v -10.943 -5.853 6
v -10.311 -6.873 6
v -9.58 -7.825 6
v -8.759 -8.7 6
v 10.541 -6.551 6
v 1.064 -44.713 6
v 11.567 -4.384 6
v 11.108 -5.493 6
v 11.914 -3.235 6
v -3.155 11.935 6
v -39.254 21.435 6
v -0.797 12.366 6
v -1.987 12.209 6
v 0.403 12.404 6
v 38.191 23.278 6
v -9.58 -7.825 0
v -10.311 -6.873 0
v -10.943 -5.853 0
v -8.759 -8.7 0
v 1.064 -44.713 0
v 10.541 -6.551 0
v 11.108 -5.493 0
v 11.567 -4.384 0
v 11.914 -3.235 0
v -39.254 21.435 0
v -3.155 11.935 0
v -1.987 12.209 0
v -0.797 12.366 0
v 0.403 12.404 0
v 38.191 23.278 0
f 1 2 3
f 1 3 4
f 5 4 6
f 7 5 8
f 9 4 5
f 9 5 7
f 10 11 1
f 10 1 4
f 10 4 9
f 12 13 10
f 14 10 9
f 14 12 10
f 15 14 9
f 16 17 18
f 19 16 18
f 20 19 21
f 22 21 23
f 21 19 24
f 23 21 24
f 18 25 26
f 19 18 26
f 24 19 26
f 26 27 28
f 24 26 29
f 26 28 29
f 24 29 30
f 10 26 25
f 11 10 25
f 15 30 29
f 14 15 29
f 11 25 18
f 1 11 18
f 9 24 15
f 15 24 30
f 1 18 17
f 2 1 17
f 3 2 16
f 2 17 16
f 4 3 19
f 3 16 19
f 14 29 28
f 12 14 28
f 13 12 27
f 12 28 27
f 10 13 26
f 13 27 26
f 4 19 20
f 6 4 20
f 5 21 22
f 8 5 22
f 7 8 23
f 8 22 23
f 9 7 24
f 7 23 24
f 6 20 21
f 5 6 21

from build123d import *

# Parameters (mm, degrees)
F1_DEPTH = 6


with BuildPart() as f1:
    # F0 (on Top) → F1 (new body)
    with BuildSketch(Plane.XY):
        with BuildLine():
            ThreePointArc((0.4028900985, 12.4038021196), (2.5709266159, 12.1679521994), (4.6613367434, 11.5465078941))
            Line((4.6613367434, 11.5465078941), (27.7654736656, 20.0070271084))
            Line((27.7654736656, 20.0070271084), (18.6411851954, 12.0324539382))
            Line((18.6411851954, 12.0324539382), (29.9736770552, 16.1823066442))
            Line((29.9736770552, 16.1823066442), (12.269739771, 0.709172083))
            ThreePointArc((12.269739771, 0.709172083), (12.2734322165, 0.5725746976), (12.2755807666, 0.4359443072))
            ThreePointArc((12.2755807666, 0.4359443072), (12.2760408839, 0.3750438497), (12.2761942576, 0.3141418472))
            ThreePointArc((12.2761942576, 0.3141418472), (12.2744790315, 0.1104832554), (12.2693338398, -0.0931175575))
            ThreePointArc((12.2693338398, -0.0931175575), (12.2708871547, -0.2050074672), (12.2714049411, -0.3169069604))
            ThreePointArc((12.2714049411, -0.3169069604), (12.1817268997, -1.786827199), (11.9140229769, -3.2349439997))
            Line((11.9140229769, -3.2349439997), (38.1905606473, 23.2777061292))
            Line((38.1905606473, 23.2777061292), (0.4028900985, 12.4038021196))
        make_face()
        with BuildLine():
            Line((27.7654736656, 20.0070271084), (4.6613367434, 11.5465078941))
            ThreePointArc((4.6613367434, 11.5465078941), (10.0808508039, 7.2618778264), (12.269739771, 0.709172083))
            Line((12.269739771, 0.709172083), (29.9736770552, 16.1823066442))
            Line((29.9736770552, 16.1823066442), (18.6411851954, 12.0324539382))
            Line((18.6411851954, 12.0324539382), (27.7654736656, 20.0070271084))
        make_face()
        with BuildLine():
            Line((3.4438568973, -34.0491190968), (7.6689007896, -9.8100899824))
            ThreePointArc((7.6689007896, -9.8100899824), (1.2485452749, -12.3612118011), (-5.520708846, -10.980492381))
            Line((-5.520708846, -10.980492381), (-0.9725498819, -34.0491190968))
            Line((-0.9725498819, -34.0491190968), (1.0998181826, -22.159966905))
            Line((1.0998181826, -22.159966905), (3.4438568973, -34.0491190968))
        make_face()
        with BuildLine():
            ThreePointArc((-12.3302375329, -1.7364179117), (-11.3293960788, 5.0993339748), (-6.749030925, 10.271320298))
            Line((-6.749030925, 10.271320298), (-29.0011271733, 17.8668124526))
            Line((-29.0011271733, 17.8668124526), (-19.7410033781, 10.1275129668))
            Line((-19.7410033781, 10.1275129668), (-31.2093305629, 14.0420919883))
            Line((-31.2093305629, 14.0420919883), (-12.3302375329, -1.7364179117))
        make_face()
        with BuildLine():
            ThreePointArc((10.6356638011, 0.0027651132), (9.2601354167, 5.3290721002), (5.4775645066, 9.3232906427))
            ThreePointArc((5.4775645066, 9.3232906427), (4.2590097093, 9.8987590223), (2.9792313185, 10.3209046376))
            ThreePointArc((2.9792313185, 10.3209046376), (2.4541666957, 10.4453946208), (1.9236286682, 10.5439847593))
            ThreePointArc((1.9236286682, 10.5439847593), (-6.8022401005, 8.1831805041), (-10.8129887968, 0.0820646923))
            ThreePointArc((-10.8129887968, 0.0820646923), (-10.702081647, -1.260968817), (-10.4277813138, -2.5803621359))
            ThreePointArc((-10.4277813138, -2.5803621359), (-10.2730604705, -3.0973265194), (-10.0931729928, -3.6060810855))
            ThreePointArc((-10.0931729928, -3.6060810855), (-3.68572215, -9.9825029817), (5.3354242901, -9.405355335))
            ThreePointArc((5.3354242901, -9.405355335), (6.4430719465, -8.6377900971), (7.4485499862, -7.7405422847))
            ThreePointArc((7.4485499862, -7.7405422847), (7.8188937649, -7.3480679932), (8.1695443246, -6.9379036738))
            ThreePointArc((8.1695443246, -6.9379036738), (10.0008142042, -3.6801219501), (10.6356638011, 0.0027651132))
        make_face()
        with BuildLine():
            ThreePointArc((-6.5153292279, 10.4129926365), (-6.2860944668, 10.5450765934), (-6.0540247496, 10.6721135715))
            ThreePointArc((-6.0540247496, 10.6721135715), (-4.6462138612, 11.3988678062), (-3.1554678048, 11.9353185591))
            Line((-3.1554678048, 11.9353185591), (-39.2543651733, 21.4351426407))
            Line((-39.2543651733, 21.4351426407), (-10.9434527883, -5.8529879996))
            ThreePointArc((-10.9434527883, -5.8529879996), (-11.8232190246, -3.8574883391), (-12.3302375329, -1.7364179117))
            Line((-12.3302375329, -1.7364179117), (-31.2093305629, 14.0420919883))
            Line((-31.2093305629, 14.0420919883), (-19.7410033781, 10.1275129668))
            Line((-19.7410033781, 10.1275129668), (-29.0011271733, 17.8668124526))
            Line((-29.0011271733, 17.8668124526), (-6.749030925, 10.271320298))
            ThreePointArc((-6.749030925, 10.271320298), (-6.6325803419, 10.3428167423), (-6.5153292279, 10.4129926365))
        make_face()
        with BuildLine():
            ThreePointArc((-8.8525103113, -8.3558995928), (-9.5275626565, -7.5262882248), (-10.1266632902, -6.6402695335))
            Line((-10.1266632902, -6.6402695335), (-10.9434527883, -5.8529879996))
            ThreePointArc((-10.9434527883, -5.8529879996), (-9.9572381658, -7.3581984231), (-8.758555172, -8.7003745594))
            Line((-8.758555172, -8.7003745594), (-8.8525103113, -8.3558995928))
        make_face()
        with BuildLine():
            ThreePointArc((10.5405626898, -6.55081412), (9.2522924087, -8.3104638603), (7.6689007896, -9.8100899824))
            Line((7.6689007896, -9.8100899824), (3.4438568973, -34.0491190968))
            Line((3.4438568973, -34.0491190968), (1.0998181826, -22.159966905))
            Line((1.0998181826, -22.159966905), (-0.9725498819, -34.0491190968))
            Line((-0.9725498819, -34.0491190968), (-5.520708846, -10.980492381))
            ThreePointArc((-5.520708846, -10.980492381), (-5.6408518746, -10.9153914399), (-5.7602515386, -10.8489369436))
            ThreePointArc((-5.7602515386, -10.8489369436), (-5.9892569814, -10.7164557955), (-6.2153090902, -10.5789960141))
            ThreePointArc((-6.2153090902, -10.5789960141), (-7.5486021639, -9.7231731384), (-8.758555172, -8.7003745594))
            Line((-8.758555172, -8.7003745594), (1.063804526, -44.7128487699))
            Line((1.063804526, -44.7128487699), (10.5405626898, -6.55081412))
        make_face()
        with BuildLine():
            Line((-9.7600062572, -5.0286772803), (-10.1642111321, -3.546709802))
            Line((-10.1642111321, -3.546709802), (-10.3919691545, -3.3563573203))
            ThreePointArc((-10.3919691545, -3.3563573203), (-10.1100176265, -4.2053770686), (-9.7600062572, -5.0286772803))
        make_face()
        with BuildLine():
            ThreePointArc((-11.7489151685, 2.2634127141), (-10.0376335343, 6.7727992383), (-6.699900485, 10.2545501984))
            Line((-6.699900485, 10.2545501984), (-6.749030925, 10.271320298))
            ThreePointArc((-6.749030925, 10.271320298), (-11.3293960788, 5.0993339748), (-12.3302375329, -1.7364179117))
            Line((-12.3302375329, -1.7364179117), (-11.7626156156, -2.2108171864))
            ThreePointArc((-11.7626156156, -2.2108171864), (-11.8887787297, -1.0636337019), (-11.9049976409, 0.0903524443))
            ThreePointArc((-11.9049976409, 0.0903524443), (-11.8759986025, 1.1804050896), (-11.7489151685, 2.2634127141))
        make_face()
        with BuildLine():
            Line((5.0125747281, -10.1984064277), (6.5174877996, -8.6799706946))
            ThreePointArc((6.5174877996, -8.6799706946), (5.9378995495, -9.0613109824), (5.3354242901, -9.405355335))
            ThreePointArc((5.3354242901, -9.405355335), (-0.132259044, -10.9947864413), (-5.6621272644, -9.6374324899))
            ThreePointArc((-5.6621272644, -9.6374324899), (-0.3974988939, -11.3017490918), (5.0125747281, -10.1984064277))
        make_face()
        with BuildLine():
            ThreePointArc((-5.6621272644, -9.6374324899), (-0.132259044, -10.9947864413), (5.3354242901, -9.405355335))
            ThreePointArc((5.3354242901, -9.405355335), (-3.68572215, -9.9825029817), (-10.0931729928, -3.6060810855))
            Line((-10.0931729928, -3.6060810855), (-10.1642111321, -3.546709802))
            Line((-10.1642111321, -3.546709802), (-9.7600062572, -5.0286772803))
            ThreePointArc((-9.7600062572, -5.0286772803), (-8.0406593478, -7.6261124412), (-5.6621272644, -9.6374324899))
        make_face()
        with BuildLine():
            ThreePointArc((6.3257916804, 9.4402202667), (9.8941847419, 5.4835945189), (11.1845627577, 0.3141418472))
            ThreePointArc((11.1845627577, 0.3141418472), (11.1827531684, 0.1146231984), (11.1773249957, -0.0848298055))
            ThreePointArc((11.1773249957, -0.0848298055), (11.1791613128, -0.2008619253), (11.1797734412, -0.3169069604))
            ThreePointArc((11.1797734412, -0.3169069604), (10.9074871997, -2.7492222186), (10.1041084384, -5.0611218442))
            Line((10.1041084384, -5.0611218442), (10.9828153628, -4.1745191439))
            ThreePointArc((10.9828153628, -4.1745191439), (11.5397204119, -2.1187882177), (11.727295301, 0.0027651132))
            ThreePointArc((11.727295301, 0.0027651132), (11.726746492, 0.1179679372), (11.7251001149, 0.2331603037))
            ThreePointArc((11.7251001149, 0.2331603037), (10.5973308535, 5.1066271569), (7.5935382455, 9.1065987374))
            Line((7.5935382455, 9.1065987374), (6.3257916804, 9.4402202667))
        make_face()
        with BuildLine():
            ThreePointArc((5.8742513084, -10.3552066112), (4.9976095842, -10.7782939798), (4.0897767259, -11.1294963939))
            Line((4.0897767259, -11.1294963939), (3.9142846746, -11.3065653599))
            ThreePointArc((3.9142846746, -11.3065653599), (4.9157385069, -10.8751190299), (5.8742513084, -10.3552066112))
        make_face()
        with BuildLine():
            ThreePointArc((11.6626764745, -3.4885490204), (11.2817381271, -4.4879671843), (10.8139737491, -5.4498128981))
            Line((10.8139737491, -5.4498128981), (10.5405626898, -6.55081412))
            ThreePointArc((10.5405626898, -6.55081412), (11.3510058434, -4.9441219916), (11.9140229769, -3.2349439997))
            Line((11.9140229769, -3.2349439997), (11.6626764745, -3.4885490204))
        make_face()
        with BuildLine():
            Line((7.6689007896, -9.8100899824), (7.7959316544, -9.0813153449))
            ThreePointArc((7.7959316544, -9.0813153449), (6.865523171, -9.764167549), (5.8742513084, -10.3552066112))
            ThreePointArc((5.8742513084, -10.3552066112), (4.9157385069, -10.8751190299), (3.9142846746, -11.3065653599))
            ThreePointArc((3.9142846746, -11.3065653599), (-0.8465994279, -12.0792452537), (-5.5307507336, -10.929559122))
            Line((-5.5307507336, -10.929559122), (-5.520708846, -10.980492381))
            ThreePointArc((-5.520708846, -10.980492381), (1.2485452749, -12.3612118011), (7.6689007896, -9.8100899824))
        make_face()
        with BuildLine():
            Line((-5.5307507336, -10.929559122), (-5.6606273112, -10.2708147133))
            ThreePointArc((-5.6606273112, -10.2708147133), (-7.5163167375, -9.0080900384), (-9.1066473086, -7.4241375373))
            Line((-9.1066473086, -7.4241375373), (-9.0329015858, -7.6945171633))
            Line((-9.0329015858, -7.6945171633), (-5.8270392256, -10.7845620799))
            ThreePointArc((-5.8270392256, -10.7845620799), (-5.6793894507, -10.8580710084), (-5.5307507336, -10.929559122))
        make_face()
        with BuildLine():
            Line((-10.7758190254, -1.304324656), (-11.3383664085, 0.758186161))
            ThreePointArc((-11.3383664085, 0.758186161), (-11.3123004869, -1.0659153578), (-10.9851179751, -2.8606235198))
            Line((-10.9851179751, -2.8606235198), (-10.3919691545, -3.3563573203))
            ThreePointArc((-10.3919691545, -3.3563573203), (-10.6326845696, -2.3394676554), (-10.7758190254, -1.304324656))
        make_face()
        with BuildLine():
            ThreePointArc((-5.5151977313, 9.7222622954), (-3.1835062565, 10.7858232363), (-0.6689941305, 11.2809755123))
            Line((-0.6689941305, 11.2809755123), (-1.8761680541, 11.5986566812))
            ThreePointArc((-1.8761680541, 11.5986566812), (-4.0430764441, 11.0133662568), (-6.0644728036, 10.0376544095))
            ThreePointArc((-6.0644728036, 10.0376544095), (-9.7211342723, 6.6242441529), (-11.6833149714, 2.0228976565))
            Line((-11.6833149714, 2.0228976565), (-11.3383664085, 0.758186161))
            ThreePointArc((-11.3383664085, 0.758186161), (-9.5888523737, 5.995118686), (-5.5151977313, 9.7222622954))
        make_face()
        with BuildLine():
            Line((7.8293850735, -8.8893934571), (7.9699316263, -8.0830794701))
            ThreePointArc((7.9699316263, -8.0830794701), (6.5792600216, -9.263781918), (5.0125747281, -10.1984064277))
            Line((5.0125747281, -10.1984064277), (4.0897767259, -11.1294963939))
            ThreePointArc((4.0897767259, -11.1294963939), (4.9976095842, -10.7782939798), (5.8742513084, -10.3552066112))
            ThreePointArc((5.8742513084, -10.3552066112), (6.8889414208, -9.6718158131), (7.8293850735, -8.8893934571))
        make_face()
        with BuildLine():
            ThreePointArc((-1.8761680541, 11.5986566812), (0.9760018676, 11.7484804193), (3.7837480213, 11.2251430982))
            Line((3.7837480213, 11.2251430982), (3.9666839612, 11.2921325313))
            ThreePointArc((3.9666839612, 11.2921325313), (1.6790161925, 11.9204940635), (-0.6873104589, 12.0900824316))
            Line((-0.6873104589, 12.0900824316), (-2.1471965404, 11.6699808248))
            Line((-2.1471965404, 11.6699808248), (-1.8761680541, 11.5986566812))
        make_face()
        with BuildLine():
            ThreePointArc((-10.8129887968, 0.0820646923), (-9.4556348454, 5.6119329127), (-5.5151977313, 9.7222622954))
            ThreePointArc((-5.5151977313, 9.7222622954), (-9.5888523737, 5.995118686), (-11.3383664085, 0.758186161))
            Line((-11.3383664085, 0.758186161), (-10.7758190254, -1.304324656))
            ThreePointArc((-10.7758190254, -1.304324656), (-10.8162752771, -0.6117163638), (-10.8129887968, 0.0820646923))
        make_face()
        with BuildLine():
            Line((10.9828153628, -4.1745191439), (10.1041084384, -5.0611218442))
            ThreePointArc((10.1041084384, -5.0611218442), (9.1649765079, -6.6624664984), (7.9699316263, -8.0830794701))
            Line((7.9699316263, -8.0830794701), (7.8293850735, -8.8893934571))
            ThreePointArc((7.8293850735, -8.8893934571), (9.6864815652, -6.7194826211), (10.9828153628, -4.1745191439))
        make_face()
        with BuildLine():
            ThreePointArc((-9.1066473086, -7.4241375373), (-10.6624834328, -5.0289977982), (-11.6131330948, -2.3357496411))
            Line((-11.6131330948, -2.3357496411), (-11.7626156156, -2.2108171864))
            ThreePointArc((-11.7626156156, -2.2108171864), (-11.1629587809, -4.5061763557), (-10.1266632902, -6.6402695335))
            Line((-10.1266632902, -6.6402695335), (-9.0329015858, -7.6945171633))
            Line((-9.0329015858, -7.6945171633), (-9.1066473086, -7.4241375373))
        make_face()
        with BuildLine():
            ThreePointArc((0.5250408565, 10.966752), (-2.5840774323, 10.776471479), (-5.5151977313, 9.7222622954))
            ThreePointArc((-5.5151977313, 9.7222622954), (-9.4556348454, 5.6119329127), (-10.8129887968, 0.0820646923))
            ThreePointArc((-10.8129887968, 0.0820646923), (-6.8022401005, 8.1831805041), (1.9236286682, 10.5439847593))
            Line((1.9236286682, 10.5439847593), (2.0105647776, 10.5758199508))
            Line((2.0105647776, 10.5758199508), (0.5250408565, 10.966752))
        make_face()
        with BuildLine():
            ThreePointArc((3.9666839612, 11.2921325313), (5.0232555587, 10.8278012509), (6.0307463325, 10.2648541669))
            ThreePointArc((6.0307463325, 10.2648541669), (6.9602600956, 9.6947139402), (7.8346304939, 9.0431526458))
            ThreePointArc((7.8346304939, 9.0431526458), (10.8842329623, 5.3064460155), (12.2306512187, 0.6750089237))
            Line((12.2306512187, 0.6750089237), (12.269739771, 0.709172083))
            ThreePointArc((12.269739771, 0.709172083), (10.0808508039, 7.2618778264), (4.6613367434, 11.5465078941))
            Line((4.6613367434, 11.5465078941), (3.9666839612, 11.2921325313))
        make_face()
        with BuildLine():
            Line((7.4485499862, -7.7405422847), (8.1536463545, -7.0291101488))
            Line((8.1536463545, -7.0291101488), (8.1695443246, -6.9379036738))
            ThreePointArc((8.1695443246, -6.9379036738), (7.8188937649, -7.3480679932), (7.4485499862, -7.7405422847))
        make_face()
        with BuildLine():
            Line((-2.8101661632, 11.8444486132), (-2.1471965404, 11.6699808248))
            Line((-2.1471965404, 11.6699808248), (-0.6873104589, 12.0900824316))
            ThreePointArc((-0.6873104589, 12.0900824316), (-1.7541754707, 12.0142554091), (-2.8101661632, 11.8444486132))
        make_face()
        with BuildLine():
            Line((7.8346304939, 9.0431526458), (7.5935382455, 9.1065987374))
            ThreePointArc((7.5935382455, 9.1065987374), (10.5973308535, 5.1066271569), (11.7251001149, 0.2331603037))
            Line((11.7251001149, 0.2331603037), (12.2306512187, 0.6750089237))
            ThreePointArc((12.2306512187, 0.6750089237), (10.8842329623, 5.3064460155), (7.8346304939, 9.0431526458))
        make_face()
        with BuildLine():
            Line((2.2892938737, 10.6778879433), (3.0151863487, 10.9437029899))
            ThreePointArc((3.0151863487, 10.9437029899), (1.1873769855, 11.2683357301), (-0.6689941305, 11.2809755123))
            Line((-0.6689941305, 11.2809755123), (0.5250408565, 10.966752))
            ThreePointArc((0.5250408565, 10.966752), (1.4130454394, 10.8582206316), (2.2892938737, 10.6778879433))
        make_face()
        with BuildLine():
            Line((-5.520708846, -10.980492381), (-5.5307507336, -10.929559122))
            ThreePointArc((-5.5307507336, -10.929559122), (-5.6793894507, -10.8580710084), (-5.8270392256, -10.7845620799))
            Line((-5.8270392256, -10.7845620799), (-5.7602515386, -10.8489369436))
            ThreePointArc((-5.7602515386, -10.8489369436), (-5.6408518746, -10.9153914399), (-5.520708846, -10.980492381))
        make_face()
        with BuildLine():
            ThreePointArc((-10.9851179751, -2.8606235198), (-11.3123004869, -1.0659153578), (-11.3383664085, 0.758186161))
            Line((-11.3383664085, 0.758186161), (-11.6833149714, 2.0228976565))
            ThreePointArc((-11.6833149714, 2.0228976565), (-11.833081188, 1.0610901318), (-11.9049976409, 0.0903524443))
            ThreePointArc((-11.9049976409, 0.0903524443), (-11.8205089053, -1.1300903691), (-11.6131330948, -2.3357496411))
            Line((-11.6131330948, -2.3357496411), (-10.9851179751, -2.8606235198))
        make_face()
        with BuildLine():
            Line((12.2755807666, 0.4359443072), (12.2532243427, 0.3459170418))
            ThreePointArc((12.2532243427, 0.3459170418), (12.2632732081, 0.1264729123), (12.2693338398, -0.0931175575))
            ThreePointArc((12.2693338398, -0.0931175575), (12.2744790315, 0.1104832554), (12.2761942576, 0.3141418472))
            ThreePointArc((12.2761942576, 0.3141418472), (12.2760408839, 0.3750438497), (12.2755807666, 0.4359443072))
        make_face()
        with BuildLine():
            ThreePointArc((-10.1266632902, -6.6402695335), (-11.1629587809, -4.5061763557), (-11.7626156156, -2.2108171864))
            Line((-11.7626156156, -2.2108171864), (-12.3302375329, -1.7364179117))
            ThreePointArc((-12.3302375329, -1.7364179117), (-11.8232190246, -3.8574883391), (-10.9434527883, -5.8529879996))
            Line((-10.9434527883, -5.8529879996), (-10.1266632902, -6.6402695335))
        make_face()
        with BuildLine():
            ThreePointArc((5.4775645066, 9.3232906427), (4.8783757276, 9.6730273462), (4.2583312258, 9.9842953506))
            Line((4.2583312258, 9.9842953506), (2.9792313185, 10.3209046376))
            ThreePointArc((2.9792313185, 10.3209046376), (4.2590097093, 9.8987590223), (5.4775645066, 9.3232906427))
        make_face()
        with BuildLine():
            ThreePointArc((10.8139737491, -5.4498128981), (9.4839425885, -7.4143177078), (7.7959316544, -9.0813153449))
            Line((7.7959316544, -9.0813153449), (7.6689007896, -9.8100899824))
            ThreePointArc((7.6689007896, -9.8100899824), (9.2522924087, -8.3104638603), (10.5405626898, -6.55081412))
            Line((10.5405626898, -6.55081412), (10.8139737491, -5.4498128981))
        make_face()
        with BuildLine():
            Line((-5.8270392256, -10.7845620799), (-9.0329015858, -7.6945171633))
            Line((-9.0329015858, -7.6945171633), (-8.8525103113, -8.3558995928))
            ThreePointArc((-8.8525103113, -8.3558995928), (-7.6135857215, -9.5619653858), (-6.2153090902, -10.5789960141))
            ThreePointArc((-6.2153090902, -10.5789960141), (-6.0221078491, -10.6835425879), (-5.8270392256, -10.7845620799))
        make_face()
        with BuildLine():
            ThreePointArc((11.1773249957, -0.0848298055), (11.1827531684, 0.1146231984), (11.1845627577, 0.3141418472))
            ThreePointArc((11.1845627577, 0.3141418472), (9.8941847419, 5.4835945189), (6.3257916804, 9.4402202667))
            Line((6.3257916804, 9.4402202667), (4.2583312258, 9.9842953506))
            ThreePointArc((4.2583312258, 9.9842953506), (4.8783757276, 9.6730273462), (5.4775645066, 9.3232906427))
            ThreePointArc((5.4775645066, 9.3232906427), (9.5878938894, 5.3828535287), (11.1773249957, -0.0848298055))
        make_face()
        with BuildLine():
            Line((-8.8525103113, -8.3558995928), (-8.758555172, -8.7003745594))
            ThreePointArc((-8.758555172, -8.7003745594), (-7.5486021639, -9.7231731384), (-6.2153090902, -10.5789960141))
            ThreePointArc((-6.2153090902, -10.5789960141), (-7.6135857215, -9.5619653858), (-8.8525103113, -8.3558995928))
        make_face()
        with BuildLine():
            ThreePointArc((9.2349654007, -5.9380747197), (10.6247367801, -3.1503590378), (11.1773249957, -0.0848298055))
            ThreePointArc((11.1773249957, -0.0848298055), (9.5878938894, 5.3828535287), (5.4775645066, 9.3232906427))
            ThreePointArc((5.4775645066, 9.3232906427), (9.2601354167, 5.3290721002), (10.6356638011, 0.0027651132))
            ThreePointArc((10.6356638011, 0.0027651132), (10.0008142042, -3.6801219501), (8.1695443246, -6.9379036738))
            Line((8.1695443246, -6.9379036738), (8.1536463545, -7.0291101488))
            Line((8.1536463545, -7.0291101488), (9.2349654007, -5.9380747197))
        make_face()
        with BuildLine():
            ThreePointArc((-9.4351143079, -6.2198536681), (-7.7490437951, -8.1499089094), (-5.6621272644, -9.6374324899))
            ThreePointArc((-5.6621272644, -9.6374324899), (-8.0406593478, -7.6261124412), (-9.7600062572, -5.0286772803))
            Line((-9.7600062572, -5.0286772803), (-9.4351143079, -6.2198536681))
        make_face()
        with BuildLine():
            Line((7.9699316263, -8.0830794701), (8.1026752808, -7.321530623))
            ThreePointArc((8.1026752808, -7.321530623), (7.3423807057, -8.03844112), (6.5174877996, -8.6799706946))
            Line((6.5174877996, -8.6799706946), (5.0125747281, -10.1984064277))
            ThreePointArc((5.0125747281, -10.1984064277), (6.5792600216, -9.263781918), (7.9699316263, -8.0830794701))
        make_face()
        with BuildLine():
            Line((7.7959316544, -9.0813153449), (7.8293850735, -8.8893934571))
            ThreePointArc((7.8293850735, -8.8893934571), (6.8889414208, -9.6718158131), (5.8742513084, -10.3552066112))
            ThreePointArc((5.8742513084, -10.3552066112), (6.865523171, -9.764167549), (7.7959316544, -9.0813153449))
        make_face()
        with BuildLine():
            ThreePointArc((-11.6131330948, -2.3357496411), (-11.8205089053, -1.1300903691), (-11.9049976409, 0.0903524443))
            ThreePointArc((-11.9049976409, 0.0903524443), (-11.8887787297, -1.0636337019), (-11.7626156156, -2.2108171864))
            Line((-11.7626156156, -2.2108171864), (-11.6131330948, -2.3357496411))
        make_face()
        with BuildLine():
            ThreePointArc((3.0151863487, 10.9437029899), (4.7330404653, 10.3296972758), (6.3257916804, 9.4402202667))
            Line((6.3257916804, 9.4402202667), (7.5935382455, 9.1065987374))
            ThreePointArc((7.5935382455, 9.1065987374), (6.8354716039, 9.717203848), (6.0307463325, 10.2648541669))
            ThreePointArc((6.0307463325, 10.2648541669), (4.9315674845, 10.8019061822), (3.7837480213, 11.2251430982))
            Line((3.7837480213, 11.2251430982), (3.0151863487, 10.9437029899))
        make_face()
        with BuildLine():
            Line((-6.4261851171, 10.4386450381), (-2.1471965404, 11.6699808248))
            Line((-2.1471965404, 11.6699808248), (-2.8101661632, 11.8444486132))
            ThreePointArc((-2.8101661632, 11.8444486132), (-4.4741120735, 11.3745413416), (-6.0540247496, 10.6721135715))
            ThreePointArc((-6.0540247496, 10.6721135715), (-6.241165359, 10.5570696756), (-6.4261851171, 10.4386450381))
        make_face()
        with BuildLine():
            ThreePointArc((-11.6833149714, 2.0228976565), (-9.7211342723, 6.6242441529), (-6.0644728036, 10.0376544095))
            Line((-6.0644728036, 10.0376544095), (-6.699900485, 10.2545501984))
            ThreePointArc((-6.699900485, 10.2545501984), (-10.0376335343, 6.7727992383), (-11.7489151685, 2.2634127141))
            Line((-11.7489151685, 2.2634127141), (-11.6833149714, 2.0228976565))
        make_face()
        with BuildLine():
            Line((-5.7602515386, -10.8489369436), (-5.8270392256, -10.7845620799))
            ThreePointArc((-5.8270392256, -10.7845620799), (-6.0221078491, -10.6835425879), (-6.2153090902, -10.5789960141))
            ThreePointArc((-6.2153090902, -10.5789960141), (-5.9892569814, -10.7164557955), (-5.7602515386, -10.8489369436))
        make_face()
        with BuildLine():
            Line((2.0105647776, 10.5758199508), (2.2892938737, 10.6778879433))
            ThreePointArc((2.2892938737, 10.6778879433), (1.4130454394, 10.8582206316), (0.5250408565, 10.966752))
            Line((0.5250408565, 10.966752), (2.0105647776, 10.5758199508))
        make_face()
        with BuildLine():
            Line((-10.1642111321, -3.546709802), (-10.4277813138, -2.5803621359))
            Line((-10.4277813138, -2.5803621359), (-10.7758190254, -1.304324656))
            ThreePointArc((-10.7758190254, -1.304324656), (-10.6326845696, -2.3394676554), (-10.3919691545, -3.3563573203))
            Line((-10.3919691545, -3.3563573203), (-10.1642111321, -3.546709802))
        make_face()
        with BuildLine():
            Line((3.9666839612, 11.2921325313), (3.7837480213, 11.2251430982))
            ThreePointArc((3.7837480213, 11.2251430982), (4.9315674845, 10.8019061822), (6.0307463325, 10.2648541669))
            ThreePointArc((6.0307463325, 10.2648541669), (5.0232555587, 10.8278012509), (3.9666839612, 11.2921325313))
        make_face()
        with BuildLine():
            ThreePointArc((1.9236286682, 10.5439847593), (2.4541666957, 10.4453946208), (2.9792313185, 10.3209046376))
            Line((2.9792313185, 10.3209046376), (2.0105647776, 10.5758199508))
            Line((2.0105647776, 10.5758199508), (1.9236286682, 10.5439847593))
        make_face()
        with BuildLine():
            ThreePointArc((-6.699900485, 10.2545501984), (-6.563670604, 10.3475310465), (-6.4261851171, 10.4386450381))
            Line((-6.4261851171, 10.4386450381), (-6.5153292279, 10.4129926365))
            ThreePointArc((-6.5153292279, 10.4129926365), (-6.6325803419, 10.3428167423), (-6.749030925, 10.271320298))
            Line((-6.749030925, 10.271320298), (-6.699900485, 10.2545501984))
        make_face()
        with BuildLine():
            ThreePointArc((-0.6873104589, 12.0900824316), (1.6790161925, 11.9204940635), (3.9666839612, 11.2921325313))
            Line((3.9666839612, 11.2921325313), (4.6613367434, 11.5465078941))
            ThreePointArc((4.6613367434, 11.5465078941), (2.5709266159, 12.1679521994), (0.4028900985, 12.4038021196))
            Line((0.4028900985, 12.4038021196), (-0.6873104589, 12.0900824316))
        make_face()
        with BuildLine():
            Line((12.269739771, 0.709172083), (12.2306512187, 0.6750089237))
            ThreePointArc((12.2306512187, 0.6750089237), (12.2430600547, 0.5105399619), (12.2532243427, 0.3459170418))
            Line((12.2532243427, 0.3459170418), (12.2755807666, 0.4359443072))
            ThreePointArc((12.2755807666, 0.4359443072), (12.2734322165, 0.5725746976), (12.269739771, 0.709172083))
        make_face()
        with BuildLine():
            Line((3.9142846746, -11.3065653599), (4.0897767259, -11.1294963939))
            ThreePointArc((4.0897767259, -11.1294963939), (-0.8761965812, -11.7308713099), (-5.6606273112, -10.2708147133))
            Line((-5.6606273112, -10.2708147133), (-5.5307507336, -10.929559122))
            ThreePointArc((-5.5307507336, -10.929559122), (-0.8465994279, -12.0792452537), (3.9142846746, -11.3065653599))
        make_face()
        with BuildLine():
            Line((0.5250408565, 10.966752), (-0.6689941305, 11.2809755123))
            ThreePointArc((-0.6689941305, 11.2809755123), (-3.1835062565, 10.7858232363), (-5.5151977313, 9.7222622954))
            ThreePointArc((-5.5151977313, 9.7222622954), (-2.5840774323, 10.776471479), (0.5250408565, 10.966752))
        make_face()
        with BuildLine():
            ThreePointArc((-10.4277813138, -2.5803621359), (-10.702081647, -1.260968817), (-10.8129887968, 0.0820646923))
            ThreePointArc((-10.8129887968, 0.0820646923), (-10.8162752771, -0.6117163638), (-10.7758190254, -1.304324656))
            Line((-10.7758190254, -1.304324656), (-10.4277813138, -2.5803621359))
        make_face()
        with BuildLine():
            ThreePointArc((5.3354242901, -9.405355335), (5.9378995495, -9.0613109824), (6.5174877996, -8.6799706946))
            Line((6.5174877996, -8.6799706946), (7.4485499862, -7.7405422847))
            ThreePointArc((7.4485499862, -7.7405422847), (6.4430719465, -8.6377900971), (5.3354242901, -9.405355335))
        make_face()
        with BuildLine():
            ThreePointArc((8.1026752808, -7.321530623), (8.6969721872, -6.652843563), (9.2349654007, -5.9380747197))
            Line((9.2349654007, -5.9380747197), (8.1536463545, -7.0291101488))
            Line((8.1536463545, -7.0291101488), (8.1026752808, -7.321530623))
        make_face()
        with BuildLine():
            ThreePointArc((11.1797734412, -0.3169069604), (11.1791613128, -0.2008619253), (11.1773249957, -0.0848298055))
            ThreePointArc((11.1773249957, -0.0848298055), (10.6247367801, -3.1503590378), (9.2349654007, -5.9380747197))
            Line((9.2349654007, -5.9380747197), (10.1041084384, -5.0611218442))
            ThreePointArc((10.1041084384, -5.0611218442), (10.9074871997, -2.7492222186), (11.1797734412, -0.3169069604))
        make_face()
        with BuildLine():
            ThreePointArc((-11.9049976409, 0.0903524443), (-11.833081188, 1.0610901318), (-11.6833149714, 2.0228976565))
            Line((-11.6833149714, 2.0228976565), (-11.7489151685, 2.2634127141))
            ThreePointArc((-11.7489151685, 2.2634127141), (-11.8759986025, 1.1804050896), (-11.9049976409, 0.0903524443))
        make_face()
        with BuildLine():
            Line((-10.3919691545, -3.3563573203), (-10.9851179751, -2.8606235198))
            ThreePointArc((-10.9851179751, -2.8606235198), (-10.3523534934, -4.6058692317), (-9.4351143079, -6.2198536681))
            Line((-9.4351143079, -6.2198536681), (-9.7600062572, -5.0286772803))
            ThreePointArc((-9.7600062572, -5.0286772803), (-10.1100176265, -4.2053770686), (-10.3919691545, -3.3563573203))
        make_face()
        with BuildLine():
            Line((-9.0329015858, -7.6945171633), (-10.1266632902, -6.6402695335))
            ThreePointArc((-10.1266632902, -6.6402695335), (-9.5275626565, -7.5262882248), (-8.8525103113, -8.3558995928))
            Line((-8.8525103113, -8.3558995928), (-9.0329015858, -7.6945171633))
        make_face()
        with BuildLine():
            Line((11.1800981262, -3.9754636615), (10.9828153628, -4.1745191439))
            ThreePointArc((10.9828153628, -4.1745191439), (9.6864815652, -6.7194826211), (7.8293850735, -8.8893934571))
            Line((7.8293850735, -8.8893934571), (7.7959316544, -9.0813153449))
            ThreePointArc((7.7959316544, -9.0813153449), (9.4839425885, -7.4143177078), (10.8139737491, -5.4498128981))
            Line((10.8139737491, -5.4498128981), (11.1800981262, -3.9754636615))
        make_face()
        with BuildLine():
            Line((11.6626764745, -3.4885490204), (11.1800981262, -3.9754636615))
            Line((11.1800981262, -3.9754636615), (10.8139737491, -5.4498128981))
            ThreePointArc((10.8139737491, -5.4498128981), (11.2817381271, -4.4879671843), (11.6626764745, -3.4885490204))
        make_face()
        with BuildLine():
            Line((4.2583312258, 9.9842953506), (6.3257916804, 9.4402202667))
            ThreePointArc((6.3257916804, 9.4402202667), (4.7330404653, 10.3296972758), (3.0151863487, 10.9437029899))
            Line((3.0151863487, 10.9437029899), (2.2892938737, 10.6778879433))
            ThreePointArc((2.2892938737, 10.6778879433), (3.2903038639, 10.3779087754), (4.2583312258, 9.9842953506))
        make_face()
        with BuildLine():
            ThreePointArc((12.2714049411, -0.3169069604), (12.2708871547, -0.2050074672), (12.2693338398, -0.0931175575))
            ThreePointArc((12.2693338398, -0.0931175575), (12.087697795, -1.8125759558), (11.6626764745, -3.4885490204))
            Line((11.6626764745, -3.4885490204), (11.9140229769, -3.2349439997))
            ThreePointArc((11.9140229769, -3.2349439997), (12.1817268997, -1.786827199), (12.2714049411, -0.3169069604))
        make_face()
        with BuildLine():
            Line((4.0897767259, -11.1294963939), (5.0125747281, -10.1984064277))
            ThreePointArc((5.0125747281, -10.1984064277), (-0.3974988939, -11.3017490918), (-5.6621272644, -9.6374324899))
            ThreePointArc((-5.6621272644, -9.6374324899), (-7.7490437951, -8.1499089094), (-9.4351143079, -6.2198536681))
            Line((-9.4351143079, -6.2198536681), (-9.1066473086, -7.4241375373))
            ThreePointArc((-9.1066473086, -7.4241375373), (-7.5163167375, -9.0080900384), (-5.6606273112, -10.2708147133))
            ThreePointArc((-5.6606273112, -10.2708147133), (-0.8761965812, -11.7308713099), (4.0897767259, -11.1294963939))
        make_face()
        with BuildLine():
            ThreePointArc((-9.4351143079, -6.2198536681), (-10.3523534934, -4.6058692317), (-10.9851179751, -2.8606235198))
            Line((-10.9851179751, -2.8606235198), (-11.6131330948, -2.3357496411))
            ThreePointArc((-11.6131330948, -2.3357496411), (-10.6624834328, -5.0289977982), (-9.1066473086, -7.4241375373))
            Line((-9.1066473086, -7.4241375373), (-9.4351143079, -6.2198536681))
        make_face()
        with BuildLine():
            ThreePointArc((-10.0931729928, -3.6060810855), (-10.2730604705, -3.0973265194), (-10.4277813138, -2.5803621359))
            Line((-10.4277813138, -2.5803621359), (-10.1642111321, -3.546709802))
            Line((-10.1642111321, -3.546709802), (-10.0931729928, -3.6060810855))
        make_face()
        with BuildLine():
            ThreePointArc((-2.8101661632, 11.8444486132), (-1.7541754707, 12.0142554091), (-0.6873104589, 12.0900824316))
            Line((-0.6873104589, 12.0900824316), (0.4028900985, 12.4038021196))
            ThreePointArc((0.4028900985, 12.4038021196), (-1.3937676775, 12.3023204147), (-3.1554678048, 11.9353185591))
            Line((-3.1554678048, 11.9353185591), (-2.8101661632, 11.8444486132))
        make_face()
        with BuildLine():
            ThreePointArc((-6.0540247496, 10.6721135715), (-4.4741120735, 11.3745413416), (-2.8101661632, 11.8444486132))
            Line((-2.8101661632, 11.8444486132), (-3.1554678048, 11.9353185591))
            ThreePointArc((-3.1554678048, 11.9353185591), (-4.6462138612, 11.3988678062), (-6.0540247496, 10.6721135715))
        make_face()
        with BuildLine():
            Line((-6.5153292279, 10.4129926365), (-6.4261851171, 10.4386450381))
            ThreePointArc((-6.4261851171, 10.4386450381), (-6.241165359, 10.5570696756), (-6.0540247496, 10.6721135715))
            ThreePointArc((-6.0540247496, 10.6721135715), (-6.2860944668, 10.5450765934), (-6.5153292279, 10.4129926365))
        make_face()
        with BuildLine():
            ThreePointArc((6.5174877996, -8.6799706946), (7.3423807057, -8.03844112), (8.1026752808, -7.321530623))
            Line((8.1026752808, -7.321530623), (8.1536463545, -7.0291101488))
            Line((8.1536463545, -7.0291101488), (7.4485499862, -7.7405422847))
            Line((7.4485499862, -7.7405422847), (6.5174877996, -8.6799706946))
        make_face()
        with BuildLine():
            Line((10.1041084384, -5.0611218442), (9.2349654007, -5.9380747197))
            ThreePointArc((9.2349654007, -5.9380747197), (8.6969721872, -6.652843563), (8.1026752808, -7.321530623))
            Line((8.1026752808, -7.321530623), (7.9699316263, -8.0830794701))
            ThreePointArc((7.9699316263, -8.0830794701), (9.1649765079, -6.6624664984), (10.1041084384, -5.0611218442))
        make_face()
        with BuildLine():
            ThreePointArc((-6.0644728036, 10.0376544095), (-4.0430764441, 11.0133662568), (-1.8761680541, 11.5986566812))
            Line((-1.8761680541, 11.5986566812), (-2.1471965404, 11.6699808248))
            Line((-2.1471965404, 11.6699808248), (-6.4261851171, 10.4386450381))
            ThreePointArc((-6.4261851171, 10.4386450381), (-6.563670604, 10.3475310465), (-6.699900485, 10.2545501984))
            Line((-6.699900485, 10.2545501984), (-6.0644728036, 10.0376544095))
        make_face()
        with BuildLine():
            ThreePointArc((12.2693338398, -0.0931175575), (12.2632732081, 0.1264729123), (12.2532243427, 0.3459170418))
            Line((12.2532243427, 0.3459170418), (11.1800981262, -3.9754636615))
            Line((11.1800981262, -3.9754636615), (11.6626764745, -3.4885490204))
            ThreePointArc((11.6626764745, -3.4885490204), (12.087697795, -1.8125759558), (12.2693338398, -0.0931175575))
        make_face()
        with BuildLine():
            ThreePointArc((-0.6689941305, 11.2809755123), (1.1873769855, 11.2683357301), (3.0151863487, 10.9437029899))
            Line((3.0151863487, 10.9437029899), (3.7837480213, 11.2251430982))
            ThreePointArc((3.7837480213, 11.2251430982), (0.9760018676, 11.7484804193), (-1.8761680541, 11.5986566812))
            Line((-1.8761680541, 11.5986566812), (-0.6689941305, 11.2809755123))
        make_face()
        with BuildLine():
            Line((2.9792313185, 10.3209046376), (4.2583312258, 9.9842953506))
            ThreePointArc((4.2583312258, 9.9842953506), (3.2903038639, 10.3779087754), (2.2892938737, 10.6778879433))
            Line((2.2892938737, 10.6778879433), (2.0105647776, 10.5758199508))
            Line((2.0105647776, 10.5758199508), (2.9792313185, 10.3209046376))
        make_face()
        with BuildLine():
            ThreePointArc((6.0307463325, 10.2648541669), (6.8354716039, 9.717203848), (7.5935382455, 9.1065987374))
            Line((7.5935382455, 9.1065987374), (7.8346304939, 9.0431526458))
            ThreePointArc((7.8346304939, 9.0431526458), (6.9602600956, 9.6947139402), (6.0307463325, 10.2648541669))
        make_face()
        with BuildLine():
            Line((12.2306512187, 0.6750089237), (11.7251001149, 0.2331603037))
            ThreePointArc((11.7251001149, 0.2331603037), (11.726746492, 0.1179679372), (11.727295301, 0.0027651132))
            ThreePointArc((11.727295301, 0.0027651132), (11.5397204119, -2.1187882177), (10.9828153628, -4.1745191439))
            Line((10.9828153628, -4.1745191439), (11.1800981262, -3.9754636615))
            Line((11.1800981262, -3.9754636615), (12.2532243427, 0.3459170418))
            ThreePointArc((12.2532243427, 0.3459170418), (12.2430600547, 0.5105399619), (12.2306512187, 0.6750089237))
        make_face()
    extrude(amount=F1_DEPTH)


solid = f1.part
